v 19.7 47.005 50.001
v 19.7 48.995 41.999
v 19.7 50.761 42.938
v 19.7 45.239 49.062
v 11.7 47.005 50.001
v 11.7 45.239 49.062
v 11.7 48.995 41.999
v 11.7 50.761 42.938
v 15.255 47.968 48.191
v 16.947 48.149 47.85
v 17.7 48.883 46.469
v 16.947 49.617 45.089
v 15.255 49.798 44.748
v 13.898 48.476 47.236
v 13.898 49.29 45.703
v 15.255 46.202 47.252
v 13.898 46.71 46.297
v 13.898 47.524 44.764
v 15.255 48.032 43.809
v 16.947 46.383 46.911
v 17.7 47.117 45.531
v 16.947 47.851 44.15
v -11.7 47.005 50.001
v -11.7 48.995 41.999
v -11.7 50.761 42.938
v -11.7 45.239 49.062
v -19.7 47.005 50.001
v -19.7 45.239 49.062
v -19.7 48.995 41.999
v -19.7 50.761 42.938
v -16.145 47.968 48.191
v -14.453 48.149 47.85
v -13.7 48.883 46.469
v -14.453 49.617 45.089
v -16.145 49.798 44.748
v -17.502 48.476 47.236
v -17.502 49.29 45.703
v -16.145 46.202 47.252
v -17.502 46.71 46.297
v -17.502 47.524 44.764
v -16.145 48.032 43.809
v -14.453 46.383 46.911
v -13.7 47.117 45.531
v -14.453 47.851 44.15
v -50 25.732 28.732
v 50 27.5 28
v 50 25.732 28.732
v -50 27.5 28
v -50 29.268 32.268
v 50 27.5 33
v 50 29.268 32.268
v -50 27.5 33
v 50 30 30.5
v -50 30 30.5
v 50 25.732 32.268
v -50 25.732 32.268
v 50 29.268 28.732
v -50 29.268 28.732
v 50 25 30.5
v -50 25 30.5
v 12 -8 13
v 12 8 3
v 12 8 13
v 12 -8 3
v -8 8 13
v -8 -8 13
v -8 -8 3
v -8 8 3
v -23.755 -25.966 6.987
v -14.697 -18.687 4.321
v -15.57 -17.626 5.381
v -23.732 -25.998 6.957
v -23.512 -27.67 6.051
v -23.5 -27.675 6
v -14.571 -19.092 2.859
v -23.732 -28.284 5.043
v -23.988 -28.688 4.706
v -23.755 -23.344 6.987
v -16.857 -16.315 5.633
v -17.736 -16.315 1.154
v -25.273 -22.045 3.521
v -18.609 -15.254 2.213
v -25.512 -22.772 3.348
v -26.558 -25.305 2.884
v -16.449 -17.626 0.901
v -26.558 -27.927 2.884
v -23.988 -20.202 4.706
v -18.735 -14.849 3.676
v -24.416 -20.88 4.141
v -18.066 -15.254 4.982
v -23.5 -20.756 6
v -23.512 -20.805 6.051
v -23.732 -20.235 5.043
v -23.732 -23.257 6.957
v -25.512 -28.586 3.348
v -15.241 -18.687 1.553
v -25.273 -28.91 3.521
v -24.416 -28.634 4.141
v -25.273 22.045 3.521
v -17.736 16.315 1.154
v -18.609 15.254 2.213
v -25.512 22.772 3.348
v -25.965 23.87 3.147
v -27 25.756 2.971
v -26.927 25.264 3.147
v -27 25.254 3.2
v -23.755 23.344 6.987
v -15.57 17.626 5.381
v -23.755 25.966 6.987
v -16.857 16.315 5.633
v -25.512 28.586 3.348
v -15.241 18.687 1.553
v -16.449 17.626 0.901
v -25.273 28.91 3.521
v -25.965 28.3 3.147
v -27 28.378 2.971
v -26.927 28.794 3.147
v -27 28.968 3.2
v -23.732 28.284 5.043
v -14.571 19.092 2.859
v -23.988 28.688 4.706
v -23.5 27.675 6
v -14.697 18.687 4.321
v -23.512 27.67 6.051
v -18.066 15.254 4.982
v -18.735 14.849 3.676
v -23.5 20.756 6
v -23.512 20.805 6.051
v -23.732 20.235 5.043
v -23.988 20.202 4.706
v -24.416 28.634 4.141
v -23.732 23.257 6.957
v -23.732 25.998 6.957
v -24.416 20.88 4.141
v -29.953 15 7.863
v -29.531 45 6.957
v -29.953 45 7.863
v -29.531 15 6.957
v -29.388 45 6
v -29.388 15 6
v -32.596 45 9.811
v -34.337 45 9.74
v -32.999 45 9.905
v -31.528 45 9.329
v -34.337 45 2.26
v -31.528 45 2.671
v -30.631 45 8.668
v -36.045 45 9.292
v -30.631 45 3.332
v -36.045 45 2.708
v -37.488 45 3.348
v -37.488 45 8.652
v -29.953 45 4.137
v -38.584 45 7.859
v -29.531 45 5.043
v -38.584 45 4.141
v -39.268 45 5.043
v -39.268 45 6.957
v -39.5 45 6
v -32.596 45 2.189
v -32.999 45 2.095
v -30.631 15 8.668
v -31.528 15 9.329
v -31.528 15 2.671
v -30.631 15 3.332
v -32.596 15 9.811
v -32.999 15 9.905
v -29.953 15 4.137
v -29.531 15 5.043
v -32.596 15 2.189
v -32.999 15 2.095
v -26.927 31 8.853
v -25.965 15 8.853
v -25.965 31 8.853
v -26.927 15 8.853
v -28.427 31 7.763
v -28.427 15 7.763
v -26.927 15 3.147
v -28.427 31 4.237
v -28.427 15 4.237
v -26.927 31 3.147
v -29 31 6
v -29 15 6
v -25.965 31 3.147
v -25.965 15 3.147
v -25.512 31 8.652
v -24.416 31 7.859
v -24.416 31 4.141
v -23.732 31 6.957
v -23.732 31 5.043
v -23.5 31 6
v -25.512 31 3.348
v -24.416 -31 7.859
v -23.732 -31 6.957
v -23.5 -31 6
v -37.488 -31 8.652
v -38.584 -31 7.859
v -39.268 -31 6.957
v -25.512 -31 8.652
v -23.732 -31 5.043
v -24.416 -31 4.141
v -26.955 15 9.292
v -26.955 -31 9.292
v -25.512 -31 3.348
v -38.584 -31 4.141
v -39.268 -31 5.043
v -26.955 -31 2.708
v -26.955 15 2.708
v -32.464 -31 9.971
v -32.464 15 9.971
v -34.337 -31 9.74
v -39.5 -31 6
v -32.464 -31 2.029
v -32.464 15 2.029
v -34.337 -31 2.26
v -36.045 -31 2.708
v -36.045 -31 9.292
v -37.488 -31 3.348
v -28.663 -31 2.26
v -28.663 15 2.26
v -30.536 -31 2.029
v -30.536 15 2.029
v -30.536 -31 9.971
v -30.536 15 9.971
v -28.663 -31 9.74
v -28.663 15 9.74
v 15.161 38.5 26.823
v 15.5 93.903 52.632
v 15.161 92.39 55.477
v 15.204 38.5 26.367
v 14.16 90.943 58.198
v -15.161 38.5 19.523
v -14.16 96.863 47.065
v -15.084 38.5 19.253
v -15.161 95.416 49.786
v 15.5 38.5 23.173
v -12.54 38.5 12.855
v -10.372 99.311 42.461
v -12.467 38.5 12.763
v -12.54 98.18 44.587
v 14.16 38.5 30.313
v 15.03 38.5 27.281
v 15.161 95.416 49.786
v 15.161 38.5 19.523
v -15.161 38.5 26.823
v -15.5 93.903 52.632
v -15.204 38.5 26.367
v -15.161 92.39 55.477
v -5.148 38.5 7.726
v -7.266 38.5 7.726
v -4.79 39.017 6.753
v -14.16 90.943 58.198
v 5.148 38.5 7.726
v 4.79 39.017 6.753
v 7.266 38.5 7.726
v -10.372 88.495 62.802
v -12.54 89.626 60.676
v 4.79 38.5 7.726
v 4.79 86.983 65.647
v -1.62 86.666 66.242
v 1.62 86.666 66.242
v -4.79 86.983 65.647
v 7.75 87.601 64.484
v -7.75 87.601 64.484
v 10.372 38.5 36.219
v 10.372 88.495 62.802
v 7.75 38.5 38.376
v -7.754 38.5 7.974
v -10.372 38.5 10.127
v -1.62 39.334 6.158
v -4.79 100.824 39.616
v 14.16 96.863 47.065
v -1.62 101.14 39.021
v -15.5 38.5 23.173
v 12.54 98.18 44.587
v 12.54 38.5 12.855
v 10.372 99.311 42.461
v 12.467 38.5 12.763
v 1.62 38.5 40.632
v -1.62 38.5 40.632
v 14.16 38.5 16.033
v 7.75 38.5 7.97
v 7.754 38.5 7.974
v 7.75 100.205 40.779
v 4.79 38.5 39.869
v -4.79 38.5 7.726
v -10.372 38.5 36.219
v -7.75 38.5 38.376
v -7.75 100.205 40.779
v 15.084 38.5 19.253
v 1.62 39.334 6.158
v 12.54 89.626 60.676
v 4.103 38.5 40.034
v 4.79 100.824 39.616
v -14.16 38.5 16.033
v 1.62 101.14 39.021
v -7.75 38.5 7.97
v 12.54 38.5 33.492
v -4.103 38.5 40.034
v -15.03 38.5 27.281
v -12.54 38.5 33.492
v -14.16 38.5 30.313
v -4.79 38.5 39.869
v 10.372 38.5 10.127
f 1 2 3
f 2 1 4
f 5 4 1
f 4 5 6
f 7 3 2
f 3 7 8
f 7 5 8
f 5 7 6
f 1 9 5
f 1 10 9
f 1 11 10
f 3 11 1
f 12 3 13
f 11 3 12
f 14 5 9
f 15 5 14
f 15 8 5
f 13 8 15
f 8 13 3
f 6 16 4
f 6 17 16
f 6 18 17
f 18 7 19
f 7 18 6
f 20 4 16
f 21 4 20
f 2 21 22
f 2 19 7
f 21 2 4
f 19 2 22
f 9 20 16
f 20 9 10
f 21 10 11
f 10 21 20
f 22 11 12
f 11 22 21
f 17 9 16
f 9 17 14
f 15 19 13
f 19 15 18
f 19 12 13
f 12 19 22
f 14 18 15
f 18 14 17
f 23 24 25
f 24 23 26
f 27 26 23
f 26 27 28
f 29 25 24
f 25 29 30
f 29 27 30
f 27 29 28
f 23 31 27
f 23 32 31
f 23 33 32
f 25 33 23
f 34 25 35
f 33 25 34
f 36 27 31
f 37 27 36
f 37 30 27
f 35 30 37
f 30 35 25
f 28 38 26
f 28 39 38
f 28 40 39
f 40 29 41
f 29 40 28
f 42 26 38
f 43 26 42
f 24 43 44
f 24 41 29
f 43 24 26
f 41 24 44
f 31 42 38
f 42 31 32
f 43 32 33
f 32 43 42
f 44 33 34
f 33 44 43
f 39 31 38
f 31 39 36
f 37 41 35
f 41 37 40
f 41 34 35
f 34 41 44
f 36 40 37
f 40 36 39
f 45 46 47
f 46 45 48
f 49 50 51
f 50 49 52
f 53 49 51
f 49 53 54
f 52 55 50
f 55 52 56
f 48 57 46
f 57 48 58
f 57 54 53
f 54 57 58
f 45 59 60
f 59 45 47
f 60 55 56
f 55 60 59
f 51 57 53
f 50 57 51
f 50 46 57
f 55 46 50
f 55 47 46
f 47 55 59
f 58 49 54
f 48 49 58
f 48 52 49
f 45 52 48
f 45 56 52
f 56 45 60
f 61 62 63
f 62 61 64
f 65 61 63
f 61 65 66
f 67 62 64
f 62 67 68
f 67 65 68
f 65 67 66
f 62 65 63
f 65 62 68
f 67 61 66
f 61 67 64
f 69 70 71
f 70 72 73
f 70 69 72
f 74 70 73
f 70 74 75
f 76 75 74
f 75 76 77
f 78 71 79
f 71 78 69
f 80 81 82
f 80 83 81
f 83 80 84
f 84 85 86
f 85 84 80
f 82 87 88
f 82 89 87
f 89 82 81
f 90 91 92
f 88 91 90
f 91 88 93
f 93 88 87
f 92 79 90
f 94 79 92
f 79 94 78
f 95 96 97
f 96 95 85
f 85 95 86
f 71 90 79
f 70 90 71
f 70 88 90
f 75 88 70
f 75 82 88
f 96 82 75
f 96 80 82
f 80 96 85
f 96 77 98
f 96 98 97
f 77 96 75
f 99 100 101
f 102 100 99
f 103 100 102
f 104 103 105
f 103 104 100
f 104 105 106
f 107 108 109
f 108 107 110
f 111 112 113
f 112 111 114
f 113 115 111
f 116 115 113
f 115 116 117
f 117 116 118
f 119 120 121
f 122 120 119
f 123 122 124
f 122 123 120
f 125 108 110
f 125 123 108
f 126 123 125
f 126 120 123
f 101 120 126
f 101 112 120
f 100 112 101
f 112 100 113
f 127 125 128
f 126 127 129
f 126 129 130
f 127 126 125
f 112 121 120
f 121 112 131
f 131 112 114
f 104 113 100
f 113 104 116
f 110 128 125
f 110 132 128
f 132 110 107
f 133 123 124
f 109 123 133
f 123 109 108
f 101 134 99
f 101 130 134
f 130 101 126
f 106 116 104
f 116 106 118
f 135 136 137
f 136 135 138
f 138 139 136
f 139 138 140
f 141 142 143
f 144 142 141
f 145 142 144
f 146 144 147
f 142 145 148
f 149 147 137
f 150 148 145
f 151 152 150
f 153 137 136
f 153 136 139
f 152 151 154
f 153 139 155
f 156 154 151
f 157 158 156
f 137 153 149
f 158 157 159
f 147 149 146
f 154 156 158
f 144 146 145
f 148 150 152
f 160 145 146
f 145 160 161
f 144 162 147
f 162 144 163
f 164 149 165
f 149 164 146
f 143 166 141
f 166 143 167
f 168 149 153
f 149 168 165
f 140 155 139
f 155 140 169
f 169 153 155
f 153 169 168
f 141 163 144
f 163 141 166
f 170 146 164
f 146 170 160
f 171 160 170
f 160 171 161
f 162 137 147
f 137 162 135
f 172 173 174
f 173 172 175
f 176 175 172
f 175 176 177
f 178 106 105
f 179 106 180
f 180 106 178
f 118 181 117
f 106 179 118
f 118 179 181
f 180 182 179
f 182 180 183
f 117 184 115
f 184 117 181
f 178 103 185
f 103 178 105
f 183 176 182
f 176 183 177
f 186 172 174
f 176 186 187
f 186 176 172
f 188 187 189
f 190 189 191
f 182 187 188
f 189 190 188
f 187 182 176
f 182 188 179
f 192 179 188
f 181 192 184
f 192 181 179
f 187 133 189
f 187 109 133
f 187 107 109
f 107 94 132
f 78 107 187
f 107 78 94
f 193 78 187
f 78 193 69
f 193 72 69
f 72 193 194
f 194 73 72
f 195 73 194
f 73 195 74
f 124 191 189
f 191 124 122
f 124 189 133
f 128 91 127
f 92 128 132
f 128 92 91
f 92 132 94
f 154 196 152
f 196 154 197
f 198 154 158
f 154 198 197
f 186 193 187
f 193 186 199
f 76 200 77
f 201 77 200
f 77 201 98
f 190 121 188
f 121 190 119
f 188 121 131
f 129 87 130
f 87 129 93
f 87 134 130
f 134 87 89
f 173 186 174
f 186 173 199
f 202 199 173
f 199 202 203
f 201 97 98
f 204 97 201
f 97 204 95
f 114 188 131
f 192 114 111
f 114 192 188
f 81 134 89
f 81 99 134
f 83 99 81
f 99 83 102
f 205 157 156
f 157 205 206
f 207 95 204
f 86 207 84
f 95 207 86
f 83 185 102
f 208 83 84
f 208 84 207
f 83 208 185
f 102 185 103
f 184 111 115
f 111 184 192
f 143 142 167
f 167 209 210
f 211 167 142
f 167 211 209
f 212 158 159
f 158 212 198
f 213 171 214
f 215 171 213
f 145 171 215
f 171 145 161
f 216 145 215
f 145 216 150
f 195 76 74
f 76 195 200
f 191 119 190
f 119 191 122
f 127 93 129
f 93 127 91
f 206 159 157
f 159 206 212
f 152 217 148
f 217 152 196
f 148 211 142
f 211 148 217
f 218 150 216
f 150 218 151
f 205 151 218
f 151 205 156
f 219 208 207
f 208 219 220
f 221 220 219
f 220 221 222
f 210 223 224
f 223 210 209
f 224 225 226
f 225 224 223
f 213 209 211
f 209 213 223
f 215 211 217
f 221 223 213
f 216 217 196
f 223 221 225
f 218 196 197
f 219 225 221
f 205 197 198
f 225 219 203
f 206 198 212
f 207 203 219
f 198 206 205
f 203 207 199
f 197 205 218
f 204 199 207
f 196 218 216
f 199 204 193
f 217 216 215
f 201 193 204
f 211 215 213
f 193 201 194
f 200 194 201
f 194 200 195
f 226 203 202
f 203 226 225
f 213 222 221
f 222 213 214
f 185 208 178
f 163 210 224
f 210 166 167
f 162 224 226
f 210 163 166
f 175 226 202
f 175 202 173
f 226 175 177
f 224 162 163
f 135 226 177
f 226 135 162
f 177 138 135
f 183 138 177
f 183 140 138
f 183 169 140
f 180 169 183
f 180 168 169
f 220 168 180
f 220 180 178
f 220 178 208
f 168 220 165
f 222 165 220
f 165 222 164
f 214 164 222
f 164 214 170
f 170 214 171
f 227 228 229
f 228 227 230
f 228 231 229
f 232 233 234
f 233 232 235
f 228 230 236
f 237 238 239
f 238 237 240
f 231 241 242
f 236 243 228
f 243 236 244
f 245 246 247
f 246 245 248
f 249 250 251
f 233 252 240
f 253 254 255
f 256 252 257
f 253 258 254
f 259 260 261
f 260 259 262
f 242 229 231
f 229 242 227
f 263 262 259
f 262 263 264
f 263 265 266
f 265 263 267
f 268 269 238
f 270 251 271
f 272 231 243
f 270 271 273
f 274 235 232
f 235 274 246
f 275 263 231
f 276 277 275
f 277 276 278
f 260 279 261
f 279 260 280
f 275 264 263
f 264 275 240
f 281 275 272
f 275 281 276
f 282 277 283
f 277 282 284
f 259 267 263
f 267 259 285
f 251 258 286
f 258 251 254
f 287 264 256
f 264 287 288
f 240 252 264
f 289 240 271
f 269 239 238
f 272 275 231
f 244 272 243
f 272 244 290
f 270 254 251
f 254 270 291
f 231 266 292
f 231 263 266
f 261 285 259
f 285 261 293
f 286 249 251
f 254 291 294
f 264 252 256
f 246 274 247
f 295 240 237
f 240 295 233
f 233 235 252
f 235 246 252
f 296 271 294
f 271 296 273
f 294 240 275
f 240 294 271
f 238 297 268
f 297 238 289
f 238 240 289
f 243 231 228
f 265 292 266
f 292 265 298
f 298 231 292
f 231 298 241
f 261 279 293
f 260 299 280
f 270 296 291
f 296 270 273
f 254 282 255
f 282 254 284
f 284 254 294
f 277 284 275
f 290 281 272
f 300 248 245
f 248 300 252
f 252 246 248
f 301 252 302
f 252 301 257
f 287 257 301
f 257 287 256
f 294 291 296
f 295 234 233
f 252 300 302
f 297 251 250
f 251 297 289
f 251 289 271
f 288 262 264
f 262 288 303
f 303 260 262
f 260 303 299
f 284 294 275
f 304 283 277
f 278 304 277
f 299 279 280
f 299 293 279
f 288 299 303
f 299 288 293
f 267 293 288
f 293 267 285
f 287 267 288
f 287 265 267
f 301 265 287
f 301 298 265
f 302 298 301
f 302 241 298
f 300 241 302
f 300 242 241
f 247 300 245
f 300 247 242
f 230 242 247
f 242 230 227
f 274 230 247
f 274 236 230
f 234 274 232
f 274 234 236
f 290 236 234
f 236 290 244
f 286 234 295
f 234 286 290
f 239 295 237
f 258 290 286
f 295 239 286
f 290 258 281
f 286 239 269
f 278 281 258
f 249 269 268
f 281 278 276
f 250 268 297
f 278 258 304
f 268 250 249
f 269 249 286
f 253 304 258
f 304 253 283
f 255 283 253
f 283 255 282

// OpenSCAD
module nose(){
	scale([1,0.8,1])  cylinder(16 ,r=3);
}


module noses(){
	difference(){
		rotate([0,11.1,0]){
			rotate([90,0,-45]) translate([0,0,24]) nose();
			rotate([90,0,-45-90]) translate([0,0,24]) nose();
		}
		translate([-47,-50,0]) cube([20,100,50]);
	}
}

module channel_out(){
	translate([-31.5,15,6])rotate([90,0,0]) scale([1,0.5,1]) 
		cylinder(46,r=8);
	intersection(){
		union(){
			translate([-34.7,45,6])rotate([90,0,0]) scale([0.64,0.5,1]) 
				cylinder(31,r=8.3);	
			translate([-26,31,6])rotate([90,0,0]) //scale([1,0.5,1]) 
				cylinder(20,r=3);
		}
		translate([-31.5,46,6])rotate([90,0,0]) scale([1,0.5,1]) 
			cylinder(76,r=8);
	}
}

module channel_in(){

	difference(){
		translate([0,63,36.2]) rotate([118,0,0])
			cylinder(70,r=15.5,center=true);
		cube([100,77,100],center=true);
	}
}


module inner(){
	noses();
	channel_out();
	channel_in();
}

module nose_body(){
	scale([1,0.8,1]) cylinder(15 ,r=5);
}

module noses_body(){
	rotate([0,11.1,0]){
		rotate([90,0,-45]) translate([0,0,25]) nose_body();
		rotate([90,0,-45-90]) translate([0,0,25]) nose_body();
	}
}

module channel_body(){
	translate([-31.5,33,6])rotate([90,0,0]) scale([1,0.5,1]) 
		cylinder(66,r=10);
	translate([-41.5,33,1])rotate([90,0,0]) 
		cube([3,10,66]);
}

module outer(){
	
	noses_body();
	channel_body();

	//cube([100,100,20])
}

module base(){

	#translate([-50,27.5,30.5])rotate([90,0,90]) cylinder(100,r=2.5);
	#translate([-8,-8,3])cube([20,16,10]);

	#translate([0,48,46]){
		translate([15.7,0,0])rotate([28,0,0])difference(){
			cube([8,2,8],center=true);
			rotate([90,0,0])cylinder(10,r=2,center=true);
		}
		translate([-15.7,0,0])rotate([28,0,0])difference(){
			cube([8,2,8],center=true);
			rotate([90,0,0])cylinder(10,r=2,center=true);
		}	
	}

}

module fan(){
	#translate([0,63,36.2]) rotate([28,0,0])
	difference(){
		cube([41.5,10,41.5],center=true);
		rotate([90,0,0])cylinder(20,r=15.5,center=true);
		translate([15.7,0,15.7])rotate([90,0,0])cylinder(20,r=2,center=true);
		translate([-15.7,0,15.7])rotate([90,0,0])cylinder(20,r=2,center=true);
		translate([15.7,0,-15.7])rotate([90,0,0])cylinder(20,r=2,center=true);
		translate([-15.7,0,-15.7])rotate([90,0,0])cylinder(20,r=2,center=true);
	}
}

base();
//fan();

//rotate([0,-90,0])
//difference(){
//	outer();
	inner();
//}
